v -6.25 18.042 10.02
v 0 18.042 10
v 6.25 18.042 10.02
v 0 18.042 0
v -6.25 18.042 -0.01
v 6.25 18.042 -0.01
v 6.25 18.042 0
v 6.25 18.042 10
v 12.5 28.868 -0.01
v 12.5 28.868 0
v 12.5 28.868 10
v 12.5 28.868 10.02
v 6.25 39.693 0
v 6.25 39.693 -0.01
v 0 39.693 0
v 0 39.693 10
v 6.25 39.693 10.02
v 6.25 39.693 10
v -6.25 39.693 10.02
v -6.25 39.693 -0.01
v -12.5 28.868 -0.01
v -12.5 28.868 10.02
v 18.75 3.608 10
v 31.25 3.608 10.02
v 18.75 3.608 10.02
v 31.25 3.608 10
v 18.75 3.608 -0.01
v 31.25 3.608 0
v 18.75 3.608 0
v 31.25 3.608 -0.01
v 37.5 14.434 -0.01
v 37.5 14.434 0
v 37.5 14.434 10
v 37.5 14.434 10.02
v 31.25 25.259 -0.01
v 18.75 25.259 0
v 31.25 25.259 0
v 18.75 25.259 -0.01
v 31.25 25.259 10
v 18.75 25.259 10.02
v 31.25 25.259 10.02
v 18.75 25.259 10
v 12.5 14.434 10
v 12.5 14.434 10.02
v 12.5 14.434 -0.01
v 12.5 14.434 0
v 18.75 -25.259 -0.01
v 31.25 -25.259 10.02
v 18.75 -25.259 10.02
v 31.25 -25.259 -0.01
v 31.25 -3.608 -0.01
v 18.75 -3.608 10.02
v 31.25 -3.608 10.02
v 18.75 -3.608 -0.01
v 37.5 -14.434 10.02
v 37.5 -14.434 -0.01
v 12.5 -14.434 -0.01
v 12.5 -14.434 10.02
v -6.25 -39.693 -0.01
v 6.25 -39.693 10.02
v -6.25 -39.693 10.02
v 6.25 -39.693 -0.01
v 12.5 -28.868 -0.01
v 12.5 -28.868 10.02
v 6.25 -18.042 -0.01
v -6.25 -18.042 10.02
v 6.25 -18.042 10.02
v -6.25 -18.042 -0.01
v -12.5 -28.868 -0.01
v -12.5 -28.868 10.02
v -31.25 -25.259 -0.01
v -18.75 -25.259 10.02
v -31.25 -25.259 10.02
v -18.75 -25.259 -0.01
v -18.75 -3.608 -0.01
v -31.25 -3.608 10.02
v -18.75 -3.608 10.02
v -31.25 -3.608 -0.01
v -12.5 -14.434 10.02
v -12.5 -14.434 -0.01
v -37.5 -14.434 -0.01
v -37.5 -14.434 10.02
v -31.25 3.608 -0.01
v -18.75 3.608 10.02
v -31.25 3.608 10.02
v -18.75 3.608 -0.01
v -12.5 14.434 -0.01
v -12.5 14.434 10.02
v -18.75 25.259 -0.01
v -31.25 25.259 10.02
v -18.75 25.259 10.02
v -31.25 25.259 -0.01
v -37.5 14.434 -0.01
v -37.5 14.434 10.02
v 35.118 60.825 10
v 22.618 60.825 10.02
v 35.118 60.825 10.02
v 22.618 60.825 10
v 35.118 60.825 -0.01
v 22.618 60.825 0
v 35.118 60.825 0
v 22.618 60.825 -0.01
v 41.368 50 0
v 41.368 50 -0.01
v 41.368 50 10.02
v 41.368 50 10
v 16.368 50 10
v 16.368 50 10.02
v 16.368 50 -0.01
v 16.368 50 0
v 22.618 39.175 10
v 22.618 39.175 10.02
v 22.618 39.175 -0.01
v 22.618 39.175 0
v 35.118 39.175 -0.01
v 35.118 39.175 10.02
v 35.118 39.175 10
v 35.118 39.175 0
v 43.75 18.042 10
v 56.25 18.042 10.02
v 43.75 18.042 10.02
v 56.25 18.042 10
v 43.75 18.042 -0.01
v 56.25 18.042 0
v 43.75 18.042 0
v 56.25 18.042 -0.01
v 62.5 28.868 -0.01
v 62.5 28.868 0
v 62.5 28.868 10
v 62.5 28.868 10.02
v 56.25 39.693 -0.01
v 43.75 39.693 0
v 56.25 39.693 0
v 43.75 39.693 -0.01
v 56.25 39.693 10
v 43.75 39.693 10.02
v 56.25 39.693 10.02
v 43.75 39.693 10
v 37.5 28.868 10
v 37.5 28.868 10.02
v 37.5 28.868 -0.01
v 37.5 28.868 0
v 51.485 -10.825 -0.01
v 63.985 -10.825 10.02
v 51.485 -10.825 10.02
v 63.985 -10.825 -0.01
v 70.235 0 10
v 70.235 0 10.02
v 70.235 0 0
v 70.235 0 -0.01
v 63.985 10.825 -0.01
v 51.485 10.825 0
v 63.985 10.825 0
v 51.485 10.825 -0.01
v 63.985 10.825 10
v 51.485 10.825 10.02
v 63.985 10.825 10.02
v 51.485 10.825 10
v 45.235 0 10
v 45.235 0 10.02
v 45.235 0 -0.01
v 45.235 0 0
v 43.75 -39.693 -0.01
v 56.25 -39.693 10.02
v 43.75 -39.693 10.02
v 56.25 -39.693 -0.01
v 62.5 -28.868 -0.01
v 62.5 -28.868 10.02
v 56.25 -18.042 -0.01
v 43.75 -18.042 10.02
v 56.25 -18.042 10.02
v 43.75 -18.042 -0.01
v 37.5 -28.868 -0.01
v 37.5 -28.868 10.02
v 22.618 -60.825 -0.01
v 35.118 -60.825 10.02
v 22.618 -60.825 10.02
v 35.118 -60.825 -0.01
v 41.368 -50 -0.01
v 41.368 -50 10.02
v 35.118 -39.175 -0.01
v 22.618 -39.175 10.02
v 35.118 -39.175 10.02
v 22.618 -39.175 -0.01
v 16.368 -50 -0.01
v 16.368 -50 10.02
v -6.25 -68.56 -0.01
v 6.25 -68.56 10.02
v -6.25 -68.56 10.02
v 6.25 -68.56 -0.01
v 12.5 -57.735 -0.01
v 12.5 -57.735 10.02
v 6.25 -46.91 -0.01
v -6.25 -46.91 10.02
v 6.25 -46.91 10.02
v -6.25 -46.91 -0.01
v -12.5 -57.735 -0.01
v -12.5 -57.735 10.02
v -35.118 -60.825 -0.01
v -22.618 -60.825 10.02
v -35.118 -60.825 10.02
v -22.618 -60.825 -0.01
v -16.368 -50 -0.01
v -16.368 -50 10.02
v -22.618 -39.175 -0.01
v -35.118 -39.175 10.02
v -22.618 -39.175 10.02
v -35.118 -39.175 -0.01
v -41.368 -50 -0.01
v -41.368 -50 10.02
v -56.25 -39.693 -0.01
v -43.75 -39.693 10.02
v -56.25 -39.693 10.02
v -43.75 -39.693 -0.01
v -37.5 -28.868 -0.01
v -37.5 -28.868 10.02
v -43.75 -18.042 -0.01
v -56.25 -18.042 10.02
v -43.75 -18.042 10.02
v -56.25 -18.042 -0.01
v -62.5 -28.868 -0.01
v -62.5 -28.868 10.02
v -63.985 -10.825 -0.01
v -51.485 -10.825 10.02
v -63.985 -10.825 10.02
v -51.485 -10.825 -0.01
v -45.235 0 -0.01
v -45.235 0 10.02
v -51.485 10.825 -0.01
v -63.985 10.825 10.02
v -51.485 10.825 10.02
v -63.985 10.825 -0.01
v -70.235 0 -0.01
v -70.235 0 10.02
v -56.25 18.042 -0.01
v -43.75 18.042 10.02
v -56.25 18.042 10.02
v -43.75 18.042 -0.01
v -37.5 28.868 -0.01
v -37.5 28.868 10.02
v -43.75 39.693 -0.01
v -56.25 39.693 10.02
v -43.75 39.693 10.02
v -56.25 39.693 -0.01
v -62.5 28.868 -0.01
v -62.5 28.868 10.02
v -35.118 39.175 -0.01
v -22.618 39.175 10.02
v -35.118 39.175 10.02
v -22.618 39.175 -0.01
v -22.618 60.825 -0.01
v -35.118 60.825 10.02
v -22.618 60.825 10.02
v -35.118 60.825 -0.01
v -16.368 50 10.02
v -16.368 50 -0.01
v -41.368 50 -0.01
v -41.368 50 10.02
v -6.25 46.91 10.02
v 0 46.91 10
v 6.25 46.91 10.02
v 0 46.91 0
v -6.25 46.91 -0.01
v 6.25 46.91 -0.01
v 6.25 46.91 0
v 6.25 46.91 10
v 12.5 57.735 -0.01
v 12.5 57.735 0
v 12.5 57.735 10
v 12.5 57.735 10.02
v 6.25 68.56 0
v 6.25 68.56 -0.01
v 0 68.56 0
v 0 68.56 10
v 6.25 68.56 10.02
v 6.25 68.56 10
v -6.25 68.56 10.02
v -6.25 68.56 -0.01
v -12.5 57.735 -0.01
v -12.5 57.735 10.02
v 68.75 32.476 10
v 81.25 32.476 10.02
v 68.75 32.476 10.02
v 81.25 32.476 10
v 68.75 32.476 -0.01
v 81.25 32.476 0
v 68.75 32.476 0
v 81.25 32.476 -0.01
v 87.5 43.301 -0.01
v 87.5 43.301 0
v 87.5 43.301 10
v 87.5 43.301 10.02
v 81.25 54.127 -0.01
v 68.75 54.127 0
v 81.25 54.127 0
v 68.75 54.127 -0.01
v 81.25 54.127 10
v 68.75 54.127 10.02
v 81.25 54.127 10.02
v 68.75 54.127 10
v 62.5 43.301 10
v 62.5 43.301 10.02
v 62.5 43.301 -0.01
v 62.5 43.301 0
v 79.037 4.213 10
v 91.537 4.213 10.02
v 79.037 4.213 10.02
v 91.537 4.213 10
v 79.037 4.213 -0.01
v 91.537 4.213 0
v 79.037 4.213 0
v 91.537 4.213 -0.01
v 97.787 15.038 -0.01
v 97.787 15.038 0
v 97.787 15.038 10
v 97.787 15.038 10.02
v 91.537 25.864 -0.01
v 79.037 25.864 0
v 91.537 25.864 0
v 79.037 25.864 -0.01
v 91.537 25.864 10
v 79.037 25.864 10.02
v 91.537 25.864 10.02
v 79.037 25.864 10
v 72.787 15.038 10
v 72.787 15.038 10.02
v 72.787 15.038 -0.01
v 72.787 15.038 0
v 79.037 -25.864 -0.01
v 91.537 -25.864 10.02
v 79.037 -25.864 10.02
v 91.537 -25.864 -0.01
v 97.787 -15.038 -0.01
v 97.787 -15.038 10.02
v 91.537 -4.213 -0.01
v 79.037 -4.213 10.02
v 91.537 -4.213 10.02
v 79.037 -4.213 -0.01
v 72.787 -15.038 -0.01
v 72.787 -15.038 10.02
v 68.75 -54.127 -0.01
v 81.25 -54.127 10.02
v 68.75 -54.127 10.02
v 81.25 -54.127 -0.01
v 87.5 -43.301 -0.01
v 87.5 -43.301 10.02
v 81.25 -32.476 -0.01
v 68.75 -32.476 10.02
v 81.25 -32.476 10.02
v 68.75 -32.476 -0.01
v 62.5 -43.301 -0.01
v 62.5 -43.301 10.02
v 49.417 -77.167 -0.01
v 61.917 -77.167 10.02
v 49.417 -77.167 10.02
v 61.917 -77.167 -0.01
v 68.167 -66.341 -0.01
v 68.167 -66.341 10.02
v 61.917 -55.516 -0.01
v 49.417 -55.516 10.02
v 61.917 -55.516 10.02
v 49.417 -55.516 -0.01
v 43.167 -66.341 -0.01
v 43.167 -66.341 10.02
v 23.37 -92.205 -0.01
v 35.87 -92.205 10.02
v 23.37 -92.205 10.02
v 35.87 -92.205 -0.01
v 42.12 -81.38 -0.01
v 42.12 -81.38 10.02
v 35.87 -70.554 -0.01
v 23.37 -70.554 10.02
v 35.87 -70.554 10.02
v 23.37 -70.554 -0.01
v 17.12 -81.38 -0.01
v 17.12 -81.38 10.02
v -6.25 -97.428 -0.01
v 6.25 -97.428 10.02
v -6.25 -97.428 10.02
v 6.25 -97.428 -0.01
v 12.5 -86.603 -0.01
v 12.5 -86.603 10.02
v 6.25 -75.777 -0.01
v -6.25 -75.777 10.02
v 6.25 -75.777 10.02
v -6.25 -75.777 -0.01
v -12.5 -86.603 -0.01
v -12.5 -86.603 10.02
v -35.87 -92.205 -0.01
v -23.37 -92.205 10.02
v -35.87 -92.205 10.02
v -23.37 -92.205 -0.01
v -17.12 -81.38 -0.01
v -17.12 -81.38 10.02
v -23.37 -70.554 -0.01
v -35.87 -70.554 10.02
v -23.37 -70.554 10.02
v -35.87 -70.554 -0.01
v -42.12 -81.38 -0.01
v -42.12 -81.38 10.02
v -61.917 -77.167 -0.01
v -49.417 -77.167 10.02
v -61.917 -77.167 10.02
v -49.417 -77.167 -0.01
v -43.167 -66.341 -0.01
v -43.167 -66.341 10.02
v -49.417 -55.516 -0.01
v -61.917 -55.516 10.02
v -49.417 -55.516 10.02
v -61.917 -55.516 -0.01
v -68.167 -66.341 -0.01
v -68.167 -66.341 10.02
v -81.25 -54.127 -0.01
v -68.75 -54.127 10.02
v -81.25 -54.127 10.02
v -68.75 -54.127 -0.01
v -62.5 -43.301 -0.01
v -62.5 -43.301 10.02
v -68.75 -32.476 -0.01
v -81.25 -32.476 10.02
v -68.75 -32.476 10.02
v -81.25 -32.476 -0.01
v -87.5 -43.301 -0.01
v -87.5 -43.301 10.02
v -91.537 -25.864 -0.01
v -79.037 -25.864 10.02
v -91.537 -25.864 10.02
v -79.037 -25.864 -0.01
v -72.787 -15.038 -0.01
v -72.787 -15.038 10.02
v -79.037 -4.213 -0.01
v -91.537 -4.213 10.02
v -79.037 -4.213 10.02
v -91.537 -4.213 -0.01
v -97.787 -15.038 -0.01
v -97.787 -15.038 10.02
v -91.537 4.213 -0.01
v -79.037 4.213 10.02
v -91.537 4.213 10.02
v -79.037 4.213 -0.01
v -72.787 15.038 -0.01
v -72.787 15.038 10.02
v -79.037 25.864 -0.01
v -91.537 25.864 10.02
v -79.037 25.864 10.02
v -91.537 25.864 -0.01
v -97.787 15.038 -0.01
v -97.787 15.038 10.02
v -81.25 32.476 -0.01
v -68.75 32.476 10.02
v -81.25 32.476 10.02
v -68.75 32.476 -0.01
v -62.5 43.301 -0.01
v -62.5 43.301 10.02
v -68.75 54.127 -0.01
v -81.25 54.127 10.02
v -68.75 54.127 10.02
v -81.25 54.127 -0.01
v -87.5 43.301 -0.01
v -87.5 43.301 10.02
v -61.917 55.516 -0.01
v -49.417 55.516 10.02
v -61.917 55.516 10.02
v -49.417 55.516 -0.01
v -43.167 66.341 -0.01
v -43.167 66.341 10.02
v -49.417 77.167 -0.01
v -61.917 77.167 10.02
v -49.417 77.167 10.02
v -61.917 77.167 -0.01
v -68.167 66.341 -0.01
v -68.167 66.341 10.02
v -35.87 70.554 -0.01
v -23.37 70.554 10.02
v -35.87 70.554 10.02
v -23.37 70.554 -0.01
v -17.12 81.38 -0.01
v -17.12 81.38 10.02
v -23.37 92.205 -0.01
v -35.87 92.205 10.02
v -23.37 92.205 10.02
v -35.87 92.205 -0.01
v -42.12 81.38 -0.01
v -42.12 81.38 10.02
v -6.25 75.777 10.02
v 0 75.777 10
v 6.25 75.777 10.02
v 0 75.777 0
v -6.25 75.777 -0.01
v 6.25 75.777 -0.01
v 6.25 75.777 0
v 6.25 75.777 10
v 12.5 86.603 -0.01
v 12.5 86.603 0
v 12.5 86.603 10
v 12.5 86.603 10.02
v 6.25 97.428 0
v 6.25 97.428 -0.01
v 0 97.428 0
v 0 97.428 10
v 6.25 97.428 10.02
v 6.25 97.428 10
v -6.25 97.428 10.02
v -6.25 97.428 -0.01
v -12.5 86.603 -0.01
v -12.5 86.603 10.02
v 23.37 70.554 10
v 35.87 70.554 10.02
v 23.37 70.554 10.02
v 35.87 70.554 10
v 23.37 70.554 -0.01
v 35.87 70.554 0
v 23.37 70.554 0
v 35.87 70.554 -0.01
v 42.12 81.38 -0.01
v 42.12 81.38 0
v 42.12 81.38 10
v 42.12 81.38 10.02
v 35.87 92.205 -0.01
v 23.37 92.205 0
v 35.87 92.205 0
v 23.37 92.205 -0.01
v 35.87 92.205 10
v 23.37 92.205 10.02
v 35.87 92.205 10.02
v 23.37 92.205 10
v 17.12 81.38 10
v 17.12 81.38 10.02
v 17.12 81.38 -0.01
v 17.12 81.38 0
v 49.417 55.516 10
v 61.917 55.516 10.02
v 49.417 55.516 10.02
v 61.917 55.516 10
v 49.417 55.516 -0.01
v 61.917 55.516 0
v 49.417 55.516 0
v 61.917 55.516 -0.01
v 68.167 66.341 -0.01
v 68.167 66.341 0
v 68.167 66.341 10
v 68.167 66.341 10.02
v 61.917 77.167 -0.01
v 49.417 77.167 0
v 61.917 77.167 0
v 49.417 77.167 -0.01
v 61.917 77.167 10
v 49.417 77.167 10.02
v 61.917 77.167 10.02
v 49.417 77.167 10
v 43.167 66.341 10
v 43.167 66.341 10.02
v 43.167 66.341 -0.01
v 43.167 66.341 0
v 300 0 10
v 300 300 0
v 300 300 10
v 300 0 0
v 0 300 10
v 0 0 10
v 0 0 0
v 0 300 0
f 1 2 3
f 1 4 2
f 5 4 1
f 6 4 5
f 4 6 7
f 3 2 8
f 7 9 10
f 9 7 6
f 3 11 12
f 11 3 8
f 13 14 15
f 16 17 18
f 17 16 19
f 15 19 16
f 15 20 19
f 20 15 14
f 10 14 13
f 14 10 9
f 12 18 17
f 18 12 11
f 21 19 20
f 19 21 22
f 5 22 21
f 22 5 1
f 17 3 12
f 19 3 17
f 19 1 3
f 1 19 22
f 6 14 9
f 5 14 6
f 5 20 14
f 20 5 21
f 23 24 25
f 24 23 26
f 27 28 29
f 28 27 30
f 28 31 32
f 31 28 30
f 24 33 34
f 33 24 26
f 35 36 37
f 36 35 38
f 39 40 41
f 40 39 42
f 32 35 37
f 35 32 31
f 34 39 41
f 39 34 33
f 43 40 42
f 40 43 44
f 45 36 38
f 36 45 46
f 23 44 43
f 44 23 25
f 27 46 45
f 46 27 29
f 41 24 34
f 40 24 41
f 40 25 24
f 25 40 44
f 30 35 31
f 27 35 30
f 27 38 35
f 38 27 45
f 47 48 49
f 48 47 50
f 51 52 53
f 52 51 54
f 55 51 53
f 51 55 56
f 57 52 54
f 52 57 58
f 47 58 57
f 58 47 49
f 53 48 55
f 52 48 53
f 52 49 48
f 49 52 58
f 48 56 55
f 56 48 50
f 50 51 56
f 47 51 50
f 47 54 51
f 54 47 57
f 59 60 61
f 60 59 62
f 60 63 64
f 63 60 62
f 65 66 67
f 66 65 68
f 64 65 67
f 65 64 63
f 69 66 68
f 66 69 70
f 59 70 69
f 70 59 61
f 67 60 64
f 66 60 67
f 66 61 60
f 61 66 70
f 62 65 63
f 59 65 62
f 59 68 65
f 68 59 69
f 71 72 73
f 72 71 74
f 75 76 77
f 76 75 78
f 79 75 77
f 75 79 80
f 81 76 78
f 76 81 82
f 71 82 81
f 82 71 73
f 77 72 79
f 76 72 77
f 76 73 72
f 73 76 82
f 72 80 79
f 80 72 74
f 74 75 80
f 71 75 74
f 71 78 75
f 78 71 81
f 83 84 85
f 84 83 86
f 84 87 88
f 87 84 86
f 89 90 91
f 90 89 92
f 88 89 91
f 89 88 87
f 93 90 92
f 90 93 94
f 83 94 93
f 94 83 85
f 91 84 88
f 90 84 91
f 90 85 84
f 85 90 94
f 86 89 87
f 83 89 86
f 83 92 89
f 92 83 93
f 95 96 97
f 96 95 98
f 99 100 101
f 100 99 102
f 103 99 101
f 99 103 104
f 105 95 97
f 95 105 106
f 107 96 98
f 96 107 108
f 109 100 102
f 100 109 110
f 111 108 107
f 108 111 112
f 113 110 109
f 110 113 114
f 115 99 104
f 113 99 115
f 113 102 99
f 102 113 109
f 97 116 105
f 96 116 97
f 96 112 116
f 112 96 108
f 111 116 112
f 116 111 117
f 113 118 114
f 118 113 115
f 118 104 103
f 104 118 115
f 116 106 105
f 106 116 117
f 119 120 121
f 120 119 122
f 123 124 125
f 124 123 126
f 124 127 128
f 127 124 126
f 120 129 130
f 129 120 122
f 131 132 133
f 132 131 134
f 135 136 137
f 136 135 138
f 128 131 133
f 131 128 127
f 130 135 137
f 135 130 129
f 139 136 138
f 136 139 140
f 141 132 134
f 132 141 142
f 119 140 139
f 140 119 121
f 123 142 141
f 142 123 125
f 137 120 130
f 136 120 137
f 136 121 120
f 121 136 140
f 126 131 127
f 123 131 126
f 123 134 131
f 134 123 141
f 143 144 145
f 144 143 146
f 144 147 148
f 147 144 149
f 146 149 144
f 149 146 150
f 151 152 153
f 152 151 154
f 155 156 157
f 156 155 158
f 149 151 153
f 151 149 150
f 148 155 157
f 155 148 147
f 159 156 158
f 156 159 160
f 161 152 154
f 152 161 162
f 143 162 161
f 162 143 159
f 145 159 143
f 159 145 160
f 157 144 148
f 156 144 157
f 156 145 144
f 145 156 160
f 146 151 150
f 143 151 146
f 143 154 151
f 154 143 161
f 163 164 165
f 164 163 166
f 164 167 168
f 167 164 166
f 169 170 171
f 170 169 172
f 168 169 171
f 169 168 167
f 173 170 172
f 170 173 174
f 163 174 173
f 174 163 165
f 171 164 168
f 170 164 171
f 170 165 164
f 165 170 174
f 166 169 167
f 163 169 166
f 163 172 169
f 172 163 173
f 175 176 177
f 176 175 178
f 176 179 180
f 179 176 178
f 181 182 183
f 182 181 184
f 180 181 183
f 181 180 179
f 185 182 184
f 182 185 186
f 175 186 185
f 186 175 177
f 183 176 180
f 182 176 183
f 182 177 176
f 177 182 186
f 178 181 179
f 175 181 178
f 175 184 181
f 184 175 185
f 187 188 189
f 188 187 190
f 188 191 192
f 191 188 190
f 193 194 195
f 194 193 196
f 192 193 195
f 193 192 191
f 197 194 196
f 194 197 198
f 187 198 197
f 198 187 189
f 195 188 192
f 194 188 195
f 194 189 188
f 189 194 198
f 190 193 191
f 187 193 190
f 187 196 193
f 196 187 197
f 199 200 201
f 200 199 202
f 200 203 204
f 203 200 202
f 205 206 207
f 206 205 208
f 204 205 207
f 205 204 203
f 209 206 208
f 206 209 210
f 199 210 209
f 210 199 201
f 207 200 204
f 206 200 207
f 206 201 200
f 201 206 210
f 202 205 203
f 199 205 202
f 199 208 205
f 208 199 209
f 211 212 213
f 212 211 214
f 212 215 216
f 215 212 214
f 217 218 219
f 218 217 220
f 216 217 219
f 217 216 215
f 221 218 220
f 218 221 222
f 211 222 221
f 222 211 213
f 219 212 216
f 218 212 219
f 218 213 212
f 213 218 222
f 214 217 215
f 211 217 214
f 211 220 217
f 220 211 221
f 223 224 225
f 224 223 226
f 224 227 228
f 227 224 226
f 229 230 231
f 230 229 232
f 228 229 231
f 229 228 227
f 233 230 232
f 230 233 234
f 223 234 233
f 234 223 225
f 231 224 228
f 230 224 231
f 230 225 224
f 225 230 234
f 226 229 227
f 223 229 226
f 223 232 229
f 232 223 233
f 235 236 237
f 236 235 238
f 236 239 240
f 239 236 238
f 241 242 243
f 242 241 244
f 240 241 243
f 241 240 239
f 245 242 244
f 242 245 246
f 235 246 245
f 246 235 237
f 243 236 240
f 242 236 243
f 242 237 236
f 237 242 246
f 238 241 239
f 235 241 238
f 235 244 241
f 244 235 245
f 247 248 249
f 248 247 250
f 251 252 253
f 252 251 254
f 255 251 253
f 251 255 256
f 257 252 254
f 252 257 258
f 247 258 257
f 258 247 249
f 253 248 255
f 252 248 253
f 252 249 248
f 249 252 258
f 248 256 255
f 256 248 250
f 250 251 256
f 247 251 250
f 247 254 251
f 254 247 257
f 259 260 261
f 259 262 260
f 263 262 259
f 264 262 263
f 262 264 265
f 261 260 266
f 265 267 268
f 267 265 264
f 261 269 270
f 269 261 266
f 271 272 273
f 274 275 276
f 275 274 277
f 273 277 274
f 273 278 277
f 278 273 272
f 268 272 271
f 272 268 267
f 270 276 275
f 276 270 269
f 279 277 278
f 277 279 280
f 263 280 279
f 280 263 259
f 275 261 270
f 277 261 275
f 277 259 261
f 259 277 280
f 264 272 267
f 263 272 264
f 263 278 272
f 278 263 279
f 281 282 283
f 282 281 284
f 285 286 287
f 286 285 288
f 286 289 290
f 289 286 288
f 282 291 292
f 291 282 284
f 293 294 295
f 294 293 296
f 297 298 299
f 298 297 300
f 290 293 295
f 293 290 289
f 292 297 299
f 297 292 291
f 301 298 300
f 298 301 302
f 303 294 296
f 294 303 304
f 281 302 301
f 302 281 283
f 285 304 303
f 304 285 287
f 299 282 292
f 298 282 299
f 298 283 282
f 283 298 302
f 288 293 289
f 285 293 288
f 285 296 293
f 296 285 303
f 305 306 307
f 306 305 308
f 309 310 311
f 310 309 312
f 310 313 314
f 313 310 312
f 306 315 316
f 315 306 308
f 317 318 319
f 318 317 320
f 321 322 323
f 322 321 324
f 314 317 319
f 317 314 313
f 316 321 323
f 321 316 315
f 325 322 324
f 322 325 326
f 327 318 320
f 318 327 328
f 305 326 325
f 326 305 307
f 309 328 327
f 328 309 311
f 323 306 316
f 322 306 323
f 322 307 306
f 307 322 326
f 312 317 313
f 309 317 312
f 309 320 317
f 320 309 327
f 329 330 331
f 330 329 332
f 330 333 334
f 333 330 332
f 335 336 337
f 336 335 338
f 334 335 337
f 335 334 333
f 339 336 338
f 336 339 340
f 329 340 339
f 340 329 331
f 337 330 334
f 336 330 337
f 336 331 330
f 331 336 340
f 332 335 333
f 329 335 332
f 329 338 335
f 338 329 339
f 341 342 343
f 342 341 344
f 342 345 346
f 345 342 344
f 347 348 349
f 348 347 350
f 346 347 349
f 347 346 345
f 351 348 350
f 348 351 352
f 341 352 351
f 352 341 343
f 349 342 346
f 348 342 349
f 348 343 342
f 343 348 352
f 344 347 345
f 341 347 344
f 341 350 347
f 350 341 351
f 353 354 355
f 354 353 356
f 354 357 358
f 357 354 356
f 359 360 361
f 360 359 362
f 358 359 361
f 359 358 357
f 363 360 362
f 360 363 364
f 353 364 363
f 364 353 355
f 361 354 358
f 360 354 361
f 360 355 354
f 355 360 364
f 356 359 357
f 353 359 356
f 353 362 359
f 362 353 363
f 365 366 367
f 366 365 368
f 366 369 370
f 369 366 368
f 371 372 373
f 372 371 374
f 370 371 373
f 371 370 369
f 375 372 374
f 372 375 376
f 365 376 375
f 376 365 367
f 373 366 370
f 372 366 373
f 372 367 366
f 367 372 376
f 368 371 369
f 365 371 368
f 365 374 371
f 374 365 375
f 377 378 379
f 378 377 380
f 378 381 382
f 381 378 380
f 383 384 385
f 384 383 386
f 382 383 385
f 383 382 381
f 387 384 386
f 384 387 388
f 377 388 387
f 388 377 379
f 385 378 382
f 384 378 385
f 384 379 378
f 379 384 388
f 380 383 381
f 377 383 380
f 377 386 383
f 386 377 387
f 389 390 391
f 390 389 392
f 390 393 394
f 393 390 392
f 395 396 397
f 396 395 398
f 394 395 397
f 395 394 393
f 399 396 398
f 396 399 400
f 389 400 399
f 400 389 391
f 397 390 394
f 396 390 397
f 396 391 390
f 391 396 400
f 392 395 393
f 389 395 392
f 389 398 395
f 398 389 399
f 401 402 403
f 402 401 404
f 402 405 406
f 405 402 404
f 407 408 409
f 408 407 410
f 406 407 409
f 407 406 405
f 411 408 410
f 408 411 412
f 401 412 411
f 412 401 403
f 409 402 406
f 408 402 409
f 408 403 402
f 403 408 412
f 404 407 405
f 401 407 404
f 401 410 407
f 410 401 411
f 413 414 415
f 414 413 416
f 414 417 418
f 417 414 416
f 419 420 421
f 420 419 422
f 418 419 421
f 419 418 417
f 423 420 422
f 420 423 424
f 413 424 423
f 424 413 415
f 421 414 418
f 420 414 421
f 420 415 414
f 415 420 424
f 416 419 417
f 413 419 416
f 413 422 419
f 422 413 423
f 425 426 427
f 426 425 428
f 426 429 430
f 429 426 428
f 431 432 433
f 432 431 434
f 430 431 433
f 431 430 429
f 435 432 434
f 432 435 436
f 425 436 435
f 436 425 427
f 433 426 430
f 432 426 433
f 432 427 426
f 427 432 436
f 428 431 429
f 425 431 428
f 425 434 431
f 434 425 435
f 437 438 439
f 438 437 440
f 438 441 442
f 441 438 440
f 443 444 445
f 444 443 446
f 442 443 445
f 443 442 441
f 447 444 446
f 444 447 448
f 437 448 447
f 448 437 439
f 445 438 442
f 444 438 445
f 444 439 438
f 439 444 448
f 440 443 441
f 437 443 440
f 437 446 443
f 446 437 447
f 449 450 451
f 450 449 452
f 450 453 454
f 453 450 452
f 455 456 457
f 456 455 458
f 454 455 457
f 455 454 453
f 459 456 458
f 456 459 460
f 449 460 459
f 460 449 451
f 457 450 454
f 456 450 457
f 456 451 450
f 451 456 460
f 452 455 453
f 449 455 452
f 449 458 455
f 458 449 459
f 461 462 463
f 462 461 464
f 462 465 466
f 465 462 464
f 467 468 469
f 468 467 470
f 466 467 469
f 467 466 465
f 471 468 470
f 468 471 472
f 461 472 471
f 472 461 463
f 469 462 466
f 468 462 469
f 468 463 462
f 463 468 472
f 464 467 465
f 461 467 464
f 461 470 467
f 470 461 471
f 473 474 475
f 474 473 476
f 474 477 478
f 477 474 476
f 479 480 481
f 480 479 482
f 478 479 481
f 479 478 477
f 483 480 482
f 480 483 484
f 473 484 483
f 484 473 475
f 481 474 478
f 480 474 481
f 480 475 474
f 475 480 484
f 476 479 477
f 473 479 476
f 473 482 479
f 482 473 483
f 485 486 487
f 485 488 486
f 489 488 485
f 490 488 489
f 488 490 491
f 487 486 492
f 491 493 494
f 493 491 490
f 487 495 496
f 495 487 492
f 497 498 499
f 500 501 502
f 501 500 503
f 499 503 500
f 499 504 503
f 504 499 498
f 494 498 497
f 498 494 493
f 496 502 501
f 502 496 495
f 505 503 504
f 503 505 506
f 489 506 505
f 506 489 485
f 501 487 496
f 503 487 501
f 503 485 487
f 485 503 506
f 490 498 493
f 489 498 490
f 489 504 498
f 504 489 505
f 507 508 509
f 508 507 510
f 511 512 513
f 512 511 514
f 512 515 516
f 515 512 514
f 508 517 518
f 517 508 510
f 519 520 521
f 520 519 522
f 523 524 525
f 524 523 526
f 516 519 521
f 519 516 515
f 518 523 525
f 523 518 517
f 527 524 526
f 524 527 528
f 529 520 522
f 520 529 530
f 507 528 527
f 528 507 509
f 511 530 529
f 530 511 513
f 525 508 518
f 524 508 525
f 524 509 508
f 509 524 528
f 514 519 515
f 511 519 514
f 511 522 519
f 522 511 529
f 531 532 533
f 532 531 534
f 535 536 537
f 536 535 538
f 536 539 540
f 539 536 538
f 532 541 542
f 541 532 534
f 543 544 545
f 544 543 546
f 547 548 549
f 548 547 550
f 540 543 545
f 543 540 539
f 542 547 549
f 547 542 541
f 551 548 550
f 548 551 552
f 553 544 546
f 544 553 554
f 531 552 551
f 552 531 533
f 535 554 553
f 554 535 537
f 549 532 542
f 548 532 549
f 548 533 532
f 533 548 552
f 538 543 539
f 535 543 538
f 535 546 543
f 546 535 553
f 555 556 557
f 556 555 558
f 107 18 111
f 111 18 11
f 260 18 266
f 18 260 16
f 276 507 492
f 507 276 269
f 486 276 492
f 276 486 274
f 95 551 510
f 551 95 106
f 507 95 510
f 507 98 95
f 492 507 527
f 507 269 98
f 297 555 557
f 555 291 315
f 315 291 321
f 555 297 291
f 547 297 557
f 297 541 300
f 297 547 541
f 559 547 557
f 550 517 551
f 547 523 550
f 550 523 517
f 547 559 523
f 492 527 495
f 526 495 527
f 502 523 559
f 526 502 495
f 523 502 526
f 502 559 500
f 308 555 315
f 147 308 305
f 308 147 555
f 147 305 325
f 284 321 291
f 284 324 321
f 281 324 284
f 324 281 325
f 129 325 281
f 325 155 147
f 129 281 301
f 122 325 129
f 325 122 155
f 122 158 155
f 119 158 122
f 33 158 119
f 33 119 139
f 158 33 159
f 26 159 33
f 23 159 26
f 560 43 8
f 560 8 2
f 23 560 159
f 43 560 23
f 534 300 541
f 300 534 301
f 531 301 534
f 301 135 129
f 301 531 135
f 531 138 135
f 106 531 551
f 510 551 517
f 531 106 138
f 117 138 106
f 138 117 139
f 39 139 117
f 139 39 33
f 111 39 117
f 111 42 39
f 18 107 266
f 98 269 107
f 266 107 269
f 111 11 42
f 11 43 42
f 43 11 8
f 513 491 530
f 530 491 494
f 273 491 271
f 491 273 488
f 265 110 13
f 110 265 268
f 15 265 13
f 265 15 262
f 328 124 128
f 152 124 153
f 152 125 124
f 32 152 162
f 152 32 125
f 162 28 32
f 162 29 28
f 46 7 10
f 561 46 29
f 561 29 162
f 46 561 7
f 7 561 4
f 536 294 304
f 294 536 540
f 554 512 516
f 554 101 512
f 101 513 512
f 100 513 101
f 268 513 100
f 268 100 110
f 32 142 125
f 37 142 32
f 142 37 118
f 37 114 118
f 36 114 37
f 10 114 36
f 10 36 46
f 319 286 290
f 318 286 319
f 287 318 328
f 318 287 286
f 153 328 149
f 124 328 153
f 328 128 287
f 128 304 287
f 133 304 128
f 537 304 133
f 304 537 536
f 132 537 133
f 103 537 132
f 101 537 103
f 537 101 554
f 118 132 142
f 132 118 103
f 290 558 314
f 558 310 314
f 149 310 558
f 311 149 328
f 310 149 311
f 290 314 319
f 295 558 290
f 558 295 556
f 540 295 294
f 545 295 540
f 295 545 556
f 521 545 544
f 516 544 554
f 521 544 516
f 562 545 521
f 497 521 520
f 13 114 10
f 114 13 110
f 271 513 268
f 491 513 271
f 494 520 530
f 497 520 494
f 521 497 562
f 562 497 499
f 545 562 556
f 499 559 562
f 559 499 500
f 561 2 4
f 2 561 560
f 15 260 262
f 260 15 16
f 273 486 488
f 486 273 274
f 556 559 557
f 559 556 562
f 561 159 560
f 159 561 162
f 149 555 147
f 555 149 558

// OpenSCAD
$fn=100;
sides = 6;;
spacing = 4;
vector = 360 / sides;
acrossFlats =50;
acrossPoints = acrossFlats /cos(vector/2);

echo (acrossPoints = acrossPoints);
hi=1;
rad=1;
dia=10;
wall_thickness = 5;


module makeCell(width, length,  offset_angle, radius, count )
{
    
    for ( neighbour = [ offset_angle: 360/count : 360 + offset_angle])
    {
        echo (neighbour = neighbour);
        translate([radius * sin(neighbour), radius * cos(neighbour), -.01])
        cylinder( h = 10 + .03, d=acrossFlats *.5 , $fn=sides);
     }

}

width = 300;
length= 300;


//difference()
{
        #cube([  width, length, 10]);
        union()
        {
            makeCell(300, 300, 0, acrossPoints/2, 6 );
            color("GREEN")
            {
                makeCell(300, 300, vector/2, acrossPoints, 12 );
            }
            
            color("BLUE")
            {
                makeCell(300, 300, vector, acrossPoints * 1.5, 18);
                //makeCell(300, 300, 0, acrossPoints );
            }
        }
 }
